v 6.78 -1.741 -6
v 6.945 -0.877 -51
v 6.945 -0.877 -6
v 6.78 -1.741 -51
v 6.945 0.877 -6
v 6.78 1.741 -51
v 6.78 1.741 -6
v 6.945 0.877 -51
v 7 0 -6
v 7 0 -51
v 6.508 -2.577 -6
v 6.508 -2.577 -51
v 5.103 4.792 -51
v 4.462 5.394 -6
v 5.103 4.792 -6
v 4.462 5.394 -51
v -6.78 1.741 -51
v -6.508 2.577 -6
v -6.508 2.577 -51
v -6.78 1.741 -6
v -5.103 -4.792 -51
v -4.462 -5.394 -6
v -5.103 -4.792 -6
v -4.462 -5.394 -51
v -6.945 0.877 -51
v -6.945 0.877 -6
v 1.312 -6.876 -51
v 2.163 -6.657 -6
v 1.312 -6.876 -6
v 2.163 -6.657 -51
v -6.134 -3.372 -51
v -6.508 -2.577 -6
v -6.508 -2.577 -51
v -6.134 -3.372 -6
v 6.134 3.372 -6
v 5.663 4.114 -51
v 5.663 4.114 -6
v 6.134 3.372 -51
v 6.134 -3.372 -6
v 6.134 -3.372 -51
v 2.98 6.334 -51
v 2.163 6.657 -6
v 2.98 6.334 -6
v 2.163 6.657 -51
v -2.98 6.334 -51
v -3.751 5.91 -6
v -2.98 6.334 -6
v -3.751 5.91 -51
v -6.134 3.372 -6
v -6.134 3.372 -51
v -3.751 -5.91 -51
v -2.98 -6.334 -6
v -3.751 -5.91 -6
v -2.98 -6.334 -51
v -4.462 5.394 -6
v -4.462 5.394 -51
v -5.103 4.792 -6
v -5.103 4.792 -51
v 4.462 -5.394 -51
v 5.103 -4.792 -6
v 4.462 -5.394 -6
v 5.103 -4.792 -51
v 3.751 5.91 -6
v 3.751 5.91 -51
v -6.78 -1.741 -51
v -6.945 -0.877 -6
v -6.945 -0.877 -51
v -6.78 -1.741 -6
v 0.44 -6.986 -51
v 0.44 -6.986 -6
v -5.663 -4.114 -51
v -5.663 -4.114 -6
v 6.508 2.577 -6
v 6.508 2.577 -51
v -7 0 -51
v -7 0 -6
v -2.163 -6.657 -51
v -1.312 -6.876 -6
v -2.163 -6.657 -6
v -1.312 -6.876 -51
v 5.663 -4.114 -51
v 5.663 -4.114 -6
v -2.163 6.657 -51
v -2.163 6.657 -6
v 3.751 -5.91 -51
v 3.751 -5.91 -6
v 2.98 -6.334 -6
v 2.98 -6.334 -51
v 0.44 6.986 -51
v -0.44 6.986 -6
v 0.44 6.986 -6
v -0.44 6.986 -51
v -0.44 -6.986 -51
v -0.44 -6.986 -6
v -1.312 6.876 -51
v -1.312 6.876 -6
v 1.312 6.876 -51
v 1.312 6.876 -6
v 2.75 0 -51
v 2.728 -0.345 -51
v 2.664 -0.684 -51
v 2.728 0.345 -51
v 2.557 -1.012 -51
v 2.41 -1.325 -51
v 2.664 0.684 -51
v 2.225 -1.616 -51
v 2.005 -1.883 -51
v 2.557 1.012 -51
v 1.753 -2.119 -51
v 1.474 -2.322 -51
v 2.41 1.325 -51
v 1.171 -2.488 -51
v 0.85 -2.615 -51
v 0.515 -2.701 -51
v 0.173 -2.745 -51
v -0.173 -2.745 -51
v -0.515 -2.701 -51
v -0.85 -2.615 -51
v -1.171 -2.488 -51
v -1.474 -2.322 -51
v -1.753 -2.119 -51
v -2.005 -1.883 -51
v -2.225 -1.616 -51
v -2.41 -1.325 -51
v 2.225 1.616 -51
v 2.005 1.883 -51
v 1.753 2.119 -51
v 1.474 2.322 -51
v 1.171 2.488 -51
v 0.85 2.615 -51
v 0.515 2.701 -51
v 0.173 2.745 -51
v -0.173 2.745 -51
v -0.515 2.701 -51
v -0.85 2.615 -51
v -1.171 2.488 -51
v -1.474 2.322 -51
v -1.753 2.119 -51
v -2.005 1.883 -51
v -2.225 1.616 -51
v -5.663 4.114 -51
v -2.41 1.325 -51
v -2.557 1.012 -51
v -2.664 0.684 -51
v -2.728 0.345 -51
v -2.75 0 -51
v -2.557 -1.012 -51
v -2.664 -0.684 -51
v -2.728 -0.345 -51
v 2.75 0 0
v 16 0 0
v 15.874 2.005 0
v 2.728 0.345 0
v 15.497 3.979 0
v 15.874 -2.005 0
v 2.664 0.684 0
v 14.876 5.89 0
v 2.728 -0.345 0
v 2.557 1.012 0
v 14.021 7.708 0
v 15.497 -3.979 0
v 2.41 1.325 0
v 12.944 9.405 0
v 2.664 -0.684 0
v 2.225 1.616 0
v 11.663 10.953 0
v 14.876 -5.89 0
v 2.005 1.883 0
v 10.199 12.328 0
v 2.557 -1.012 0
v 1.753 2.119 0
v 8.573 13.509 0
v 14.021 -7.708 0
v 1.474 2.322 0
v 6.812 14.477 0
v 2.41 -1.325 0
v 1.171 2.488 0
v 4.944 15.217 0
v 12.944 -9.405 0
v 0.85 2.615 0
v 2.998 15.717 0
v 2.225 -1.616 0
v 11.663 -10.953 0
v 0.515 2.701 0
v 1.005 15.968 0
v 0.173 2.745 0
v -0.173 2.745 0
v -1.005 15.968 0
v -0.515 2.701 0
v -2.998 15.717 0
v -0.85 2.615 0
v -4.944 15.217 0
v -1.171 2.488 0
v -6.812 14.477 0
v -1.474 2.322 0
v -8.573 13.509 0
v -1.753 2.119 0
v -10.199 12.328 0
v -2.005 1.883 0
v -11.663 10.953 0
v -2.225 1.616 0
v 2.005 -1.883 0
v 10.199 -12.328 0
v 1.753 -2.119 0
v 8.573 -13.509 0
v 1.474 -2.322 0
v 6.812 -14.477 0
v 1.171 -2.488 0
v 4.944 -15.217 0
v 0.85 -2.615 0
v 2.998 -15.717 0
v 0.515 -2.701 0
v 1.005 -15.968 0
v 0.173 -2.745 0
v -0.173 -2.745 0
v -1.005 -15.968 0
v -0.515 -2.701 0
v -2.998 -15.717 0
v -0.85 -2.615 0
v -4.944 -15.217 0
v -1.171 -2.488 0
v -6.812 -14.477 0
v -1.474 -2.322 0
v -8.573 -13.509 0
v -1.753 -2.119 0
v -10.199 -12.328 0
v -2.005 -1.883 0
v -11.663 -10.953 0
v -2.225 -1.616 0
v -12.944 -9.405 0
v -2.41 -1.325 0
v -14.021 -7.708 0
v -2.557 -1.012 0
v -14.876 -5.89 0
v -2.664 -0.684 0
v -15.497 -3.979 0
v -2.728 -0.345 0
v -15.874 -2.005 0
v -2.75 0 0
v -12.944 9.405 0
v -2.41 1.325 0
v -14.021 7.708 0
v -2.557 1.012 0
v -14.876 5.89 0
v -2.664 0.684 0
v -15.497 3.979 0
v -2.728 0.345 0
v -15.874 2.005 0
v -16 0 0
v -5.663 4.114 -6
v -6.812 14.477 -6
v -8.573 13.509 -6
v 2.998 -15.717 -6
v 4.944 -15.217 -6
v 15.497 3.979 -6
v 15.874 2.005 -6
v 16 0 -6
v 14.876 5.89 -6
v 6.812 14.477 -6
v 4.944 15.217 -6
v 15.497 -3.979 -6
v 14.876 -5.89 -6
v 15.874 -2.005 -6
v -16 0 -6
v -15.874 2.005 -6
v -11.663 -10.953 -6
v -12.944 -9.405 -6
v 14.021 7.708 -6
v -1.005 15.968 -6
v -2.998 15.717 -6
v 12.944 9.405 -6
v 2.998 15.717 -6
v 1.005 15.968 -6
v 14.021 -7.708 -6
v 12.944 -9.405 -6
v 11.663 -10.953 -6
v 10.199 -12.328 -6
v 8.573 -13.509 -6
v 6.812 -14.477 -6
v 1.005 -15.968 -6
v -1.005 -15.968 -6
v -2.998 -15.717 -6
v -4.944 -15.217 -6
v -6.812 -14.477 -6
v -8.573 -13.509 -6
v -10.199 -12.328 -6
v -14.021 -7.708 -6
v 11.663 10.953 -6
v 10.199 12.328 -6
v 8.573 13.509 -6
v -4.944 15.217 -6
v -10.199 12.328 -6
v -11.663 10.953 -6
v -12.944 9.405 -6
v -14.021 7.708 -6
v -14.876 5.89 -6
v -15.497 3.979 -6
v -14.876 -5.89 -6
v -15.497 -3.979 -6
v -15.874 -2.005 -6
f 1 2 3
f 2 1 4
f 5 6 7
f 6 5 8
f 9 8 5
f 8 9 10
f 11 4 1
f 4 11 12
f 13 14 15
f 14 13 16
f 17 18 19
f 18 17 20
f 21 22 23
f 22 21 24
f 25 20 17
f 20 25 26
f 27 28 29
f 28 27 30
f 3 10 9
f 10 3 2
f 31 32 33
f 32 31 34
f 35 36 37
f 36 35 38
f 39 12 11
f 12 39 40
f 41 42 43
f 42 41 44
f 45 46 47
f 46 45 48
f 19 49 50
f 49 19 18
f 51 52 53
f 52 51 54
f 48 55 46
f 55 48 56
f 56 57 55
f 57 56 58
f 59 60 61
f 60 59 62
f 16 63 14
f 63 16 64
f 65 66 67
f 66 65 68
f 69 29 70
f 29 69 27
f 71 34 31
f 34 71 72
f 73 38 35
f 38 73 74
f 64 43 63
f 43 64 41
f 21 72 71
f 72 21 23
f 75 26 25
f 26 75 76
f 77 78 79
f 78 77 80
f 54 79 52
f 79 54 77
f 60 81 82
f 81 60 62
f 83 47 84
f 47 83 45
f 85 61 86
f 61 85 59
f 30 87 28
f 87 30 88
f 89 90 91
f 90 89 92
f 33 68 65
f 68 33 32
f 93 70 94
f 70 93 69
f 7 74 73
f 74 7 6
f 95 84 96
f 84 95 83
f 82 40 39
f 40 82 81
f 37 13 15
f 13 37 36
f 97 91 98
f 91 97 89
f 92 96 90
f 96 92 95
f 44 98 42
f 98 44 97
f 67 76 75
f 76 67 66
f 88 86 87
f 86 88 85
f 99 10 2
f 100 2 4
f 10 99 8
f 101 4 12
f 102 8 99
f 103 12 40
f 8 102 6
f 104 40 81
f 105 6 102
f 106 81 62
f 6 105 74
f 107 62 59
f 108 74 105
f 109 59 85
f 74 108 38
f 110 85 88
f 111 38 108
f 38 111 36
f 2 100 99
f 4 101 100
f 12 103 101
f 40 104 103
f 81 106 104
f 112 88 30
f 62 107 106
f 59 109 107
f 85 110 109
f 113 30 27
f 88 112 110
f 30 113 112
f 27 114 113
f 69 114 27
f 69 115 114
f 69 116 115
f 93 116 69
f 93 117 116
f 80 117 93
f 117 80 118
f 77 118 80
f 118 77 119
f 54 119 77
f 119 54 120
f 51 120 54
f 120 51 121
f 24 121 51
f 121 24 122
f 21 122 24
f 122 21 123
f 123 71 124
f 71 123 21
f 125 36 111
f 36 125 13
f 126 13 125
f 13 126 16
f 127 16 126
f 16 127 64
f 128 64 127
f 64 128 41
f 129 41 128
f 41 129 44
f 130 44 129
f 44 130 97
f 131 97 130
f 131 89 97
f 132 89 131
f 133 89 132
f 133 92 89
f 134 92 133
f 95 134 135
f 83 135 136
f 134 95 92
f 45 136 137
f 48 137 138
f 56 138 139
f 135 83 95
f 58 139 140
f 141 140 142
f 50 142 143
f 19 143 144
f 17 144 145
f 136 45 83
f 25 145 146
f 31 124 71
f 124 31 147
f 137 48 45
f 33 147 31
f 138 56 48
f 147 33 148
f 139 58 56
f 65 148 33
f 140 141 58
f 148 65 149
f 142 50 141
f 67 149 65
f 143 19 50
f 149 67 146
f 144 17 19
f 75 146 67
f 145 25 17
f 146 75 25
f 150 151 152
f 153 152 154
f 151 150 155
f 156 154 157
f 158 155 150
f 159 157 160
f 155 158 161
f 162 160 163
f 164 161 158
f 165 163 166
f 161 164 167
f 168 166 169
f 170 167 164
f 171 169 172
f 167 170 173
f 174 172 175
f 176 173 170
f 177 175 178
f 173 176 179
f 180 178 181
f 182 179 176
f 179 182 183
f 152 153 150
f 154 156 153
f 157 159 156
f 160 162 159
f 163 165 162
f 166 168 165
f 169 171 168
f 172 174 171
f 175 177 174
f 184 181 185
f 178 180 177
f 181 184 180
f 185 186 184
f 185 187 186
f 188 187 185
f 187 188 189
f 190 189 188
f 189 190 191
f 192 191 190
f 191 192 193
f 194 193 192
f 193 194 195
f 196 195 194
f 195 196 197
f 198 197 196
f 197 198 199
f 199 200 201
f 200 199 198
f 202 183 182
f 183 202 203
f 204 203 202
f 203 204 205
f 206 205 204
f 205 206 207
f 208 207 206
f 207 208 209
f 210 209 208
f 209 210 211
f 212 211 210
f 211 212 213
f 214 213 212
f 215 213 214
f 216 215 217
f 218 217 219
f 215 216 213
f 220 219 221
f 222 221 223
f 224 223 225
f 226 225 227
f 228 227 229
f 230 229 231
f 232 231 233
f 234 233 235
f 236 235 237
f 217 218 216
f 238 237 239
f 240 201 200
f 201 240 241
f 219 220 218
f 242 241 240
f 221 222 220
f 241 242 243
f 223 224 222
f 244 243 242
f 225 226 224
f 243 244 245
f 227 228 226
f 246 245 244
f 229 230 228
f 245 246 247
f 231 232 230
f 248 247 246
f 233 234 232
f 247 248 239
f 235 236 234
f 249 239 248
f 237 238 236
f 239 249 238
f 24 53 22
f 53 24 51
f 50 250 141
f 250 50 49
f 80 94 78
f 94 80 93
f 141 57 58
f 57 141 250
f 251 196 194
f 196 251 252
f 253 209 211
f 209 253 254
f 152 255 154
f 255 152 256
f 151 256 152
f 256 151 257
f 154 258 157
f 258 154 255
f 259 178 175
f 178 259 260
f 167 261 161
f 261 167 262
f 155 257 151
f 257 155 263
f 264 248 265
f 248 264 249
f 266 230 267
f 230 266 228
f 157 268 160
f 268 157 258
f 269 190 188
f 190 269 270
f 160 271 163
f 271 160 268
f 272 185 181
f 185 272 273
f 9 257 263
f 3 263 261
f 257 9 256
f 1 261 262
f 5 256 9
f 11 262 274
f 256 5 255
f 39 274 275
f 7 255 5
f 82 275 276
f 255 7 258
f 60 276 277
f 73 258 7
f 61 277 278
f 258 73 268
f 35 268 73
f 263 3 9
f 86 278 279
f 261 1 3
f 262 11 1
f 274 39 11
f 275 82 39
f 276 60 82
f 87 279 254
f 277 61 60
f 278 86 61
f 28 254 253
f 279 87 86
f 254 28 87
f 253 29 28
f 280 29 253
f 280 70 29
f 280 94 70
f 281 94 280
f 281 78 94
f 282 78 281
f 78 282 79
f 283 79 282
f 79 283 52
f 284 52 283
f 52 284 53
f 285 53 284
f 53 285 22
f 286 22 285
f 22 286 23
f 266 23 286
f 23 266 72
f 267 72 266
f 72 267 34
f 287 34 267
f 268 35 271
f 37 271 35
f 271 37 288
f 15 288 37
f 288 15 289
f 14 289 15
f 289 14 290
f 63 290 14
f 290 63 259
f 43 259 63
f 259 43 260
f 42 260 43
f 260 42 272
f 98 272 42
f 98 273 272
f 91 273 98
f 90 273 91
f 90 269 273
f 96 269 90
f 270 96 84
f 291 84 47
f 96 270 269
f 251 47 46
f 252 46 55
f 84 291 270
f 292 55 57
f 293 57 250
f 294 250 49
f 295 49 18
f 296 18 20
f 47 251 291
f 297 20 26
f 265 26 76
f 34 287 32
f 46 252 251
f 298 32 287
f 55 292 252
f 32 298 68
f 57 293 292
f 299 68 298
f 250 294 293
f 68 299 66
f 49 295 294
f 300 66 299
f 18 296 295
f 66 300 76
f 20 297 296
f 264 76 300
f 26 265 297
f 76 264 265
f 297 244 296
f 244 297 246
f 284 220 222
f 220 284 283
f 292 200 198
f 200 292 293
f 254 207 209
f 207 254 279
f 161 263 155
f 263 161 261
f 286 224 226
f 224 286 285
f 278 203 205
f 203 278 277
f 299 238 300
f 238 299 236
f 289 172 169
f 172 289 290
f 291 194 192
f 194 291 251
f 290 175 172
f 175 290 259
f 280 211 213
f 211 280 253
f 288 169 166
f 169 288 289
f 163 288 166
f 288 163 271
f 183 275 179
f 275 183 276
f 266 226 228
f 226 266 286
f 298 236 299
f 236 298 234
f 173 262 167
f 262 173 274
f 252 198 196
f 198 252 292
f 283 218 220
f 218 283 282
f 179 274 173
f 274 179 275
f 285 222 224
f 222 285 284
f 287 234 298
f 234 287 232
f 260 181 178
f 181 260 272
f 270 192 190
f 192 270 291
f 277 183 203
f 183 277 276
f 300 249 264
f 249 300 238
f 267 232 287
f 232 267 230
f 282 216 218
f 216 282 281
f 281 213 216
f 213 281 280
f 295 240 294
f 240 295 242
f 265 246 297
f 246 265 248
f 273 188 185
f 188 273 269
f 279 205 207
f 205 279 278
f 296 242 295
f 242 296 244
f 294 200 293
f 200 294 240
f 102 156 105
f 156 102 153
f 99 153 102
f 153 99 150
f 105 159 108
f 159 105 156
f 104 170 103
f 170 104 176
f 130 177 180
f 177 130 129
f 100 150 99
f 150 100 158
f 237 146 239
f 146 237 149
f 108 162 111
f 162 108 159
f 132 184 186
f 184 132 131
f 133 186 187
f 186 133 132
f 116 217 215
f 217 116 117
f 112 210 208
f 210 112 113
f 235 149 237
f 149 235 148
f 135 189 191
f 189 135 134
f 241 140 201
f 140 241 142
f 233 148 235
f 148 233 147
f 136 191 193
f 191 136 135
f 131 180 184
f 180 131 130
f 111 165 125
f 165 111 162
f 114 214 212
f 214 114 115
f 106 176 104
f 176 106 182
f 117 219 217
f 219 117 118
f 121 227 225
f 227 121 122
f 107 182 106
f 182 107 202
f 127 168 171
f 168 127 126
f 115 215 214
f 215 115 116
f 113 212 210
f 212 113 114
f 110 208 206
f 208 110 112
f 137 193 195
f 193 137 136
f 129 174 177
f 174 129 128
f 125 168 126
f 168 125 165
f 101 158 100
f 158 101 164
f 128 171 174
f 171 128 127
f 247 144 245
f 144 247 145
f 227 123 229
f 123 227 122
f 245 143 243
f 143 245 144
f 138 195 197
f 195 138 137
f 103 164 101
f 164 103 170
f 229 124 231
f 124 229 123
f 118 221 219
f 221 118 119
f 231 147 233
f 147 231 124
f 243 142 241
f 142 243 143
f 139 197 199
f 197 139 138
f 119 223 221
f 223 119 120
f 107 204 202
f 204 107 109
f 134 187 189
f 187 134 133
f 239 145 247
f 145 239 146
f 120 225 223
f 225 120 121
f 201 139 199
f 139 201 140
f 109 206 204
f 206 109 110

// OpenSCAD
$fn = 50;


difference() {
	union() {
		translate(v = [0, 0, -51.0000000000]) {
			cylinder(h = 51, r = 7.0000000000);
		}
		translate(v = [0, 0, -6.0000000000]) {
			cylinder(h = 6, r = 16.0000000000);
		}
	}
	union() {
		#translate(v = [0, 0, -51]) {
			cylinder(h = 51, r = 2.7500000000);
		}
	}
}
